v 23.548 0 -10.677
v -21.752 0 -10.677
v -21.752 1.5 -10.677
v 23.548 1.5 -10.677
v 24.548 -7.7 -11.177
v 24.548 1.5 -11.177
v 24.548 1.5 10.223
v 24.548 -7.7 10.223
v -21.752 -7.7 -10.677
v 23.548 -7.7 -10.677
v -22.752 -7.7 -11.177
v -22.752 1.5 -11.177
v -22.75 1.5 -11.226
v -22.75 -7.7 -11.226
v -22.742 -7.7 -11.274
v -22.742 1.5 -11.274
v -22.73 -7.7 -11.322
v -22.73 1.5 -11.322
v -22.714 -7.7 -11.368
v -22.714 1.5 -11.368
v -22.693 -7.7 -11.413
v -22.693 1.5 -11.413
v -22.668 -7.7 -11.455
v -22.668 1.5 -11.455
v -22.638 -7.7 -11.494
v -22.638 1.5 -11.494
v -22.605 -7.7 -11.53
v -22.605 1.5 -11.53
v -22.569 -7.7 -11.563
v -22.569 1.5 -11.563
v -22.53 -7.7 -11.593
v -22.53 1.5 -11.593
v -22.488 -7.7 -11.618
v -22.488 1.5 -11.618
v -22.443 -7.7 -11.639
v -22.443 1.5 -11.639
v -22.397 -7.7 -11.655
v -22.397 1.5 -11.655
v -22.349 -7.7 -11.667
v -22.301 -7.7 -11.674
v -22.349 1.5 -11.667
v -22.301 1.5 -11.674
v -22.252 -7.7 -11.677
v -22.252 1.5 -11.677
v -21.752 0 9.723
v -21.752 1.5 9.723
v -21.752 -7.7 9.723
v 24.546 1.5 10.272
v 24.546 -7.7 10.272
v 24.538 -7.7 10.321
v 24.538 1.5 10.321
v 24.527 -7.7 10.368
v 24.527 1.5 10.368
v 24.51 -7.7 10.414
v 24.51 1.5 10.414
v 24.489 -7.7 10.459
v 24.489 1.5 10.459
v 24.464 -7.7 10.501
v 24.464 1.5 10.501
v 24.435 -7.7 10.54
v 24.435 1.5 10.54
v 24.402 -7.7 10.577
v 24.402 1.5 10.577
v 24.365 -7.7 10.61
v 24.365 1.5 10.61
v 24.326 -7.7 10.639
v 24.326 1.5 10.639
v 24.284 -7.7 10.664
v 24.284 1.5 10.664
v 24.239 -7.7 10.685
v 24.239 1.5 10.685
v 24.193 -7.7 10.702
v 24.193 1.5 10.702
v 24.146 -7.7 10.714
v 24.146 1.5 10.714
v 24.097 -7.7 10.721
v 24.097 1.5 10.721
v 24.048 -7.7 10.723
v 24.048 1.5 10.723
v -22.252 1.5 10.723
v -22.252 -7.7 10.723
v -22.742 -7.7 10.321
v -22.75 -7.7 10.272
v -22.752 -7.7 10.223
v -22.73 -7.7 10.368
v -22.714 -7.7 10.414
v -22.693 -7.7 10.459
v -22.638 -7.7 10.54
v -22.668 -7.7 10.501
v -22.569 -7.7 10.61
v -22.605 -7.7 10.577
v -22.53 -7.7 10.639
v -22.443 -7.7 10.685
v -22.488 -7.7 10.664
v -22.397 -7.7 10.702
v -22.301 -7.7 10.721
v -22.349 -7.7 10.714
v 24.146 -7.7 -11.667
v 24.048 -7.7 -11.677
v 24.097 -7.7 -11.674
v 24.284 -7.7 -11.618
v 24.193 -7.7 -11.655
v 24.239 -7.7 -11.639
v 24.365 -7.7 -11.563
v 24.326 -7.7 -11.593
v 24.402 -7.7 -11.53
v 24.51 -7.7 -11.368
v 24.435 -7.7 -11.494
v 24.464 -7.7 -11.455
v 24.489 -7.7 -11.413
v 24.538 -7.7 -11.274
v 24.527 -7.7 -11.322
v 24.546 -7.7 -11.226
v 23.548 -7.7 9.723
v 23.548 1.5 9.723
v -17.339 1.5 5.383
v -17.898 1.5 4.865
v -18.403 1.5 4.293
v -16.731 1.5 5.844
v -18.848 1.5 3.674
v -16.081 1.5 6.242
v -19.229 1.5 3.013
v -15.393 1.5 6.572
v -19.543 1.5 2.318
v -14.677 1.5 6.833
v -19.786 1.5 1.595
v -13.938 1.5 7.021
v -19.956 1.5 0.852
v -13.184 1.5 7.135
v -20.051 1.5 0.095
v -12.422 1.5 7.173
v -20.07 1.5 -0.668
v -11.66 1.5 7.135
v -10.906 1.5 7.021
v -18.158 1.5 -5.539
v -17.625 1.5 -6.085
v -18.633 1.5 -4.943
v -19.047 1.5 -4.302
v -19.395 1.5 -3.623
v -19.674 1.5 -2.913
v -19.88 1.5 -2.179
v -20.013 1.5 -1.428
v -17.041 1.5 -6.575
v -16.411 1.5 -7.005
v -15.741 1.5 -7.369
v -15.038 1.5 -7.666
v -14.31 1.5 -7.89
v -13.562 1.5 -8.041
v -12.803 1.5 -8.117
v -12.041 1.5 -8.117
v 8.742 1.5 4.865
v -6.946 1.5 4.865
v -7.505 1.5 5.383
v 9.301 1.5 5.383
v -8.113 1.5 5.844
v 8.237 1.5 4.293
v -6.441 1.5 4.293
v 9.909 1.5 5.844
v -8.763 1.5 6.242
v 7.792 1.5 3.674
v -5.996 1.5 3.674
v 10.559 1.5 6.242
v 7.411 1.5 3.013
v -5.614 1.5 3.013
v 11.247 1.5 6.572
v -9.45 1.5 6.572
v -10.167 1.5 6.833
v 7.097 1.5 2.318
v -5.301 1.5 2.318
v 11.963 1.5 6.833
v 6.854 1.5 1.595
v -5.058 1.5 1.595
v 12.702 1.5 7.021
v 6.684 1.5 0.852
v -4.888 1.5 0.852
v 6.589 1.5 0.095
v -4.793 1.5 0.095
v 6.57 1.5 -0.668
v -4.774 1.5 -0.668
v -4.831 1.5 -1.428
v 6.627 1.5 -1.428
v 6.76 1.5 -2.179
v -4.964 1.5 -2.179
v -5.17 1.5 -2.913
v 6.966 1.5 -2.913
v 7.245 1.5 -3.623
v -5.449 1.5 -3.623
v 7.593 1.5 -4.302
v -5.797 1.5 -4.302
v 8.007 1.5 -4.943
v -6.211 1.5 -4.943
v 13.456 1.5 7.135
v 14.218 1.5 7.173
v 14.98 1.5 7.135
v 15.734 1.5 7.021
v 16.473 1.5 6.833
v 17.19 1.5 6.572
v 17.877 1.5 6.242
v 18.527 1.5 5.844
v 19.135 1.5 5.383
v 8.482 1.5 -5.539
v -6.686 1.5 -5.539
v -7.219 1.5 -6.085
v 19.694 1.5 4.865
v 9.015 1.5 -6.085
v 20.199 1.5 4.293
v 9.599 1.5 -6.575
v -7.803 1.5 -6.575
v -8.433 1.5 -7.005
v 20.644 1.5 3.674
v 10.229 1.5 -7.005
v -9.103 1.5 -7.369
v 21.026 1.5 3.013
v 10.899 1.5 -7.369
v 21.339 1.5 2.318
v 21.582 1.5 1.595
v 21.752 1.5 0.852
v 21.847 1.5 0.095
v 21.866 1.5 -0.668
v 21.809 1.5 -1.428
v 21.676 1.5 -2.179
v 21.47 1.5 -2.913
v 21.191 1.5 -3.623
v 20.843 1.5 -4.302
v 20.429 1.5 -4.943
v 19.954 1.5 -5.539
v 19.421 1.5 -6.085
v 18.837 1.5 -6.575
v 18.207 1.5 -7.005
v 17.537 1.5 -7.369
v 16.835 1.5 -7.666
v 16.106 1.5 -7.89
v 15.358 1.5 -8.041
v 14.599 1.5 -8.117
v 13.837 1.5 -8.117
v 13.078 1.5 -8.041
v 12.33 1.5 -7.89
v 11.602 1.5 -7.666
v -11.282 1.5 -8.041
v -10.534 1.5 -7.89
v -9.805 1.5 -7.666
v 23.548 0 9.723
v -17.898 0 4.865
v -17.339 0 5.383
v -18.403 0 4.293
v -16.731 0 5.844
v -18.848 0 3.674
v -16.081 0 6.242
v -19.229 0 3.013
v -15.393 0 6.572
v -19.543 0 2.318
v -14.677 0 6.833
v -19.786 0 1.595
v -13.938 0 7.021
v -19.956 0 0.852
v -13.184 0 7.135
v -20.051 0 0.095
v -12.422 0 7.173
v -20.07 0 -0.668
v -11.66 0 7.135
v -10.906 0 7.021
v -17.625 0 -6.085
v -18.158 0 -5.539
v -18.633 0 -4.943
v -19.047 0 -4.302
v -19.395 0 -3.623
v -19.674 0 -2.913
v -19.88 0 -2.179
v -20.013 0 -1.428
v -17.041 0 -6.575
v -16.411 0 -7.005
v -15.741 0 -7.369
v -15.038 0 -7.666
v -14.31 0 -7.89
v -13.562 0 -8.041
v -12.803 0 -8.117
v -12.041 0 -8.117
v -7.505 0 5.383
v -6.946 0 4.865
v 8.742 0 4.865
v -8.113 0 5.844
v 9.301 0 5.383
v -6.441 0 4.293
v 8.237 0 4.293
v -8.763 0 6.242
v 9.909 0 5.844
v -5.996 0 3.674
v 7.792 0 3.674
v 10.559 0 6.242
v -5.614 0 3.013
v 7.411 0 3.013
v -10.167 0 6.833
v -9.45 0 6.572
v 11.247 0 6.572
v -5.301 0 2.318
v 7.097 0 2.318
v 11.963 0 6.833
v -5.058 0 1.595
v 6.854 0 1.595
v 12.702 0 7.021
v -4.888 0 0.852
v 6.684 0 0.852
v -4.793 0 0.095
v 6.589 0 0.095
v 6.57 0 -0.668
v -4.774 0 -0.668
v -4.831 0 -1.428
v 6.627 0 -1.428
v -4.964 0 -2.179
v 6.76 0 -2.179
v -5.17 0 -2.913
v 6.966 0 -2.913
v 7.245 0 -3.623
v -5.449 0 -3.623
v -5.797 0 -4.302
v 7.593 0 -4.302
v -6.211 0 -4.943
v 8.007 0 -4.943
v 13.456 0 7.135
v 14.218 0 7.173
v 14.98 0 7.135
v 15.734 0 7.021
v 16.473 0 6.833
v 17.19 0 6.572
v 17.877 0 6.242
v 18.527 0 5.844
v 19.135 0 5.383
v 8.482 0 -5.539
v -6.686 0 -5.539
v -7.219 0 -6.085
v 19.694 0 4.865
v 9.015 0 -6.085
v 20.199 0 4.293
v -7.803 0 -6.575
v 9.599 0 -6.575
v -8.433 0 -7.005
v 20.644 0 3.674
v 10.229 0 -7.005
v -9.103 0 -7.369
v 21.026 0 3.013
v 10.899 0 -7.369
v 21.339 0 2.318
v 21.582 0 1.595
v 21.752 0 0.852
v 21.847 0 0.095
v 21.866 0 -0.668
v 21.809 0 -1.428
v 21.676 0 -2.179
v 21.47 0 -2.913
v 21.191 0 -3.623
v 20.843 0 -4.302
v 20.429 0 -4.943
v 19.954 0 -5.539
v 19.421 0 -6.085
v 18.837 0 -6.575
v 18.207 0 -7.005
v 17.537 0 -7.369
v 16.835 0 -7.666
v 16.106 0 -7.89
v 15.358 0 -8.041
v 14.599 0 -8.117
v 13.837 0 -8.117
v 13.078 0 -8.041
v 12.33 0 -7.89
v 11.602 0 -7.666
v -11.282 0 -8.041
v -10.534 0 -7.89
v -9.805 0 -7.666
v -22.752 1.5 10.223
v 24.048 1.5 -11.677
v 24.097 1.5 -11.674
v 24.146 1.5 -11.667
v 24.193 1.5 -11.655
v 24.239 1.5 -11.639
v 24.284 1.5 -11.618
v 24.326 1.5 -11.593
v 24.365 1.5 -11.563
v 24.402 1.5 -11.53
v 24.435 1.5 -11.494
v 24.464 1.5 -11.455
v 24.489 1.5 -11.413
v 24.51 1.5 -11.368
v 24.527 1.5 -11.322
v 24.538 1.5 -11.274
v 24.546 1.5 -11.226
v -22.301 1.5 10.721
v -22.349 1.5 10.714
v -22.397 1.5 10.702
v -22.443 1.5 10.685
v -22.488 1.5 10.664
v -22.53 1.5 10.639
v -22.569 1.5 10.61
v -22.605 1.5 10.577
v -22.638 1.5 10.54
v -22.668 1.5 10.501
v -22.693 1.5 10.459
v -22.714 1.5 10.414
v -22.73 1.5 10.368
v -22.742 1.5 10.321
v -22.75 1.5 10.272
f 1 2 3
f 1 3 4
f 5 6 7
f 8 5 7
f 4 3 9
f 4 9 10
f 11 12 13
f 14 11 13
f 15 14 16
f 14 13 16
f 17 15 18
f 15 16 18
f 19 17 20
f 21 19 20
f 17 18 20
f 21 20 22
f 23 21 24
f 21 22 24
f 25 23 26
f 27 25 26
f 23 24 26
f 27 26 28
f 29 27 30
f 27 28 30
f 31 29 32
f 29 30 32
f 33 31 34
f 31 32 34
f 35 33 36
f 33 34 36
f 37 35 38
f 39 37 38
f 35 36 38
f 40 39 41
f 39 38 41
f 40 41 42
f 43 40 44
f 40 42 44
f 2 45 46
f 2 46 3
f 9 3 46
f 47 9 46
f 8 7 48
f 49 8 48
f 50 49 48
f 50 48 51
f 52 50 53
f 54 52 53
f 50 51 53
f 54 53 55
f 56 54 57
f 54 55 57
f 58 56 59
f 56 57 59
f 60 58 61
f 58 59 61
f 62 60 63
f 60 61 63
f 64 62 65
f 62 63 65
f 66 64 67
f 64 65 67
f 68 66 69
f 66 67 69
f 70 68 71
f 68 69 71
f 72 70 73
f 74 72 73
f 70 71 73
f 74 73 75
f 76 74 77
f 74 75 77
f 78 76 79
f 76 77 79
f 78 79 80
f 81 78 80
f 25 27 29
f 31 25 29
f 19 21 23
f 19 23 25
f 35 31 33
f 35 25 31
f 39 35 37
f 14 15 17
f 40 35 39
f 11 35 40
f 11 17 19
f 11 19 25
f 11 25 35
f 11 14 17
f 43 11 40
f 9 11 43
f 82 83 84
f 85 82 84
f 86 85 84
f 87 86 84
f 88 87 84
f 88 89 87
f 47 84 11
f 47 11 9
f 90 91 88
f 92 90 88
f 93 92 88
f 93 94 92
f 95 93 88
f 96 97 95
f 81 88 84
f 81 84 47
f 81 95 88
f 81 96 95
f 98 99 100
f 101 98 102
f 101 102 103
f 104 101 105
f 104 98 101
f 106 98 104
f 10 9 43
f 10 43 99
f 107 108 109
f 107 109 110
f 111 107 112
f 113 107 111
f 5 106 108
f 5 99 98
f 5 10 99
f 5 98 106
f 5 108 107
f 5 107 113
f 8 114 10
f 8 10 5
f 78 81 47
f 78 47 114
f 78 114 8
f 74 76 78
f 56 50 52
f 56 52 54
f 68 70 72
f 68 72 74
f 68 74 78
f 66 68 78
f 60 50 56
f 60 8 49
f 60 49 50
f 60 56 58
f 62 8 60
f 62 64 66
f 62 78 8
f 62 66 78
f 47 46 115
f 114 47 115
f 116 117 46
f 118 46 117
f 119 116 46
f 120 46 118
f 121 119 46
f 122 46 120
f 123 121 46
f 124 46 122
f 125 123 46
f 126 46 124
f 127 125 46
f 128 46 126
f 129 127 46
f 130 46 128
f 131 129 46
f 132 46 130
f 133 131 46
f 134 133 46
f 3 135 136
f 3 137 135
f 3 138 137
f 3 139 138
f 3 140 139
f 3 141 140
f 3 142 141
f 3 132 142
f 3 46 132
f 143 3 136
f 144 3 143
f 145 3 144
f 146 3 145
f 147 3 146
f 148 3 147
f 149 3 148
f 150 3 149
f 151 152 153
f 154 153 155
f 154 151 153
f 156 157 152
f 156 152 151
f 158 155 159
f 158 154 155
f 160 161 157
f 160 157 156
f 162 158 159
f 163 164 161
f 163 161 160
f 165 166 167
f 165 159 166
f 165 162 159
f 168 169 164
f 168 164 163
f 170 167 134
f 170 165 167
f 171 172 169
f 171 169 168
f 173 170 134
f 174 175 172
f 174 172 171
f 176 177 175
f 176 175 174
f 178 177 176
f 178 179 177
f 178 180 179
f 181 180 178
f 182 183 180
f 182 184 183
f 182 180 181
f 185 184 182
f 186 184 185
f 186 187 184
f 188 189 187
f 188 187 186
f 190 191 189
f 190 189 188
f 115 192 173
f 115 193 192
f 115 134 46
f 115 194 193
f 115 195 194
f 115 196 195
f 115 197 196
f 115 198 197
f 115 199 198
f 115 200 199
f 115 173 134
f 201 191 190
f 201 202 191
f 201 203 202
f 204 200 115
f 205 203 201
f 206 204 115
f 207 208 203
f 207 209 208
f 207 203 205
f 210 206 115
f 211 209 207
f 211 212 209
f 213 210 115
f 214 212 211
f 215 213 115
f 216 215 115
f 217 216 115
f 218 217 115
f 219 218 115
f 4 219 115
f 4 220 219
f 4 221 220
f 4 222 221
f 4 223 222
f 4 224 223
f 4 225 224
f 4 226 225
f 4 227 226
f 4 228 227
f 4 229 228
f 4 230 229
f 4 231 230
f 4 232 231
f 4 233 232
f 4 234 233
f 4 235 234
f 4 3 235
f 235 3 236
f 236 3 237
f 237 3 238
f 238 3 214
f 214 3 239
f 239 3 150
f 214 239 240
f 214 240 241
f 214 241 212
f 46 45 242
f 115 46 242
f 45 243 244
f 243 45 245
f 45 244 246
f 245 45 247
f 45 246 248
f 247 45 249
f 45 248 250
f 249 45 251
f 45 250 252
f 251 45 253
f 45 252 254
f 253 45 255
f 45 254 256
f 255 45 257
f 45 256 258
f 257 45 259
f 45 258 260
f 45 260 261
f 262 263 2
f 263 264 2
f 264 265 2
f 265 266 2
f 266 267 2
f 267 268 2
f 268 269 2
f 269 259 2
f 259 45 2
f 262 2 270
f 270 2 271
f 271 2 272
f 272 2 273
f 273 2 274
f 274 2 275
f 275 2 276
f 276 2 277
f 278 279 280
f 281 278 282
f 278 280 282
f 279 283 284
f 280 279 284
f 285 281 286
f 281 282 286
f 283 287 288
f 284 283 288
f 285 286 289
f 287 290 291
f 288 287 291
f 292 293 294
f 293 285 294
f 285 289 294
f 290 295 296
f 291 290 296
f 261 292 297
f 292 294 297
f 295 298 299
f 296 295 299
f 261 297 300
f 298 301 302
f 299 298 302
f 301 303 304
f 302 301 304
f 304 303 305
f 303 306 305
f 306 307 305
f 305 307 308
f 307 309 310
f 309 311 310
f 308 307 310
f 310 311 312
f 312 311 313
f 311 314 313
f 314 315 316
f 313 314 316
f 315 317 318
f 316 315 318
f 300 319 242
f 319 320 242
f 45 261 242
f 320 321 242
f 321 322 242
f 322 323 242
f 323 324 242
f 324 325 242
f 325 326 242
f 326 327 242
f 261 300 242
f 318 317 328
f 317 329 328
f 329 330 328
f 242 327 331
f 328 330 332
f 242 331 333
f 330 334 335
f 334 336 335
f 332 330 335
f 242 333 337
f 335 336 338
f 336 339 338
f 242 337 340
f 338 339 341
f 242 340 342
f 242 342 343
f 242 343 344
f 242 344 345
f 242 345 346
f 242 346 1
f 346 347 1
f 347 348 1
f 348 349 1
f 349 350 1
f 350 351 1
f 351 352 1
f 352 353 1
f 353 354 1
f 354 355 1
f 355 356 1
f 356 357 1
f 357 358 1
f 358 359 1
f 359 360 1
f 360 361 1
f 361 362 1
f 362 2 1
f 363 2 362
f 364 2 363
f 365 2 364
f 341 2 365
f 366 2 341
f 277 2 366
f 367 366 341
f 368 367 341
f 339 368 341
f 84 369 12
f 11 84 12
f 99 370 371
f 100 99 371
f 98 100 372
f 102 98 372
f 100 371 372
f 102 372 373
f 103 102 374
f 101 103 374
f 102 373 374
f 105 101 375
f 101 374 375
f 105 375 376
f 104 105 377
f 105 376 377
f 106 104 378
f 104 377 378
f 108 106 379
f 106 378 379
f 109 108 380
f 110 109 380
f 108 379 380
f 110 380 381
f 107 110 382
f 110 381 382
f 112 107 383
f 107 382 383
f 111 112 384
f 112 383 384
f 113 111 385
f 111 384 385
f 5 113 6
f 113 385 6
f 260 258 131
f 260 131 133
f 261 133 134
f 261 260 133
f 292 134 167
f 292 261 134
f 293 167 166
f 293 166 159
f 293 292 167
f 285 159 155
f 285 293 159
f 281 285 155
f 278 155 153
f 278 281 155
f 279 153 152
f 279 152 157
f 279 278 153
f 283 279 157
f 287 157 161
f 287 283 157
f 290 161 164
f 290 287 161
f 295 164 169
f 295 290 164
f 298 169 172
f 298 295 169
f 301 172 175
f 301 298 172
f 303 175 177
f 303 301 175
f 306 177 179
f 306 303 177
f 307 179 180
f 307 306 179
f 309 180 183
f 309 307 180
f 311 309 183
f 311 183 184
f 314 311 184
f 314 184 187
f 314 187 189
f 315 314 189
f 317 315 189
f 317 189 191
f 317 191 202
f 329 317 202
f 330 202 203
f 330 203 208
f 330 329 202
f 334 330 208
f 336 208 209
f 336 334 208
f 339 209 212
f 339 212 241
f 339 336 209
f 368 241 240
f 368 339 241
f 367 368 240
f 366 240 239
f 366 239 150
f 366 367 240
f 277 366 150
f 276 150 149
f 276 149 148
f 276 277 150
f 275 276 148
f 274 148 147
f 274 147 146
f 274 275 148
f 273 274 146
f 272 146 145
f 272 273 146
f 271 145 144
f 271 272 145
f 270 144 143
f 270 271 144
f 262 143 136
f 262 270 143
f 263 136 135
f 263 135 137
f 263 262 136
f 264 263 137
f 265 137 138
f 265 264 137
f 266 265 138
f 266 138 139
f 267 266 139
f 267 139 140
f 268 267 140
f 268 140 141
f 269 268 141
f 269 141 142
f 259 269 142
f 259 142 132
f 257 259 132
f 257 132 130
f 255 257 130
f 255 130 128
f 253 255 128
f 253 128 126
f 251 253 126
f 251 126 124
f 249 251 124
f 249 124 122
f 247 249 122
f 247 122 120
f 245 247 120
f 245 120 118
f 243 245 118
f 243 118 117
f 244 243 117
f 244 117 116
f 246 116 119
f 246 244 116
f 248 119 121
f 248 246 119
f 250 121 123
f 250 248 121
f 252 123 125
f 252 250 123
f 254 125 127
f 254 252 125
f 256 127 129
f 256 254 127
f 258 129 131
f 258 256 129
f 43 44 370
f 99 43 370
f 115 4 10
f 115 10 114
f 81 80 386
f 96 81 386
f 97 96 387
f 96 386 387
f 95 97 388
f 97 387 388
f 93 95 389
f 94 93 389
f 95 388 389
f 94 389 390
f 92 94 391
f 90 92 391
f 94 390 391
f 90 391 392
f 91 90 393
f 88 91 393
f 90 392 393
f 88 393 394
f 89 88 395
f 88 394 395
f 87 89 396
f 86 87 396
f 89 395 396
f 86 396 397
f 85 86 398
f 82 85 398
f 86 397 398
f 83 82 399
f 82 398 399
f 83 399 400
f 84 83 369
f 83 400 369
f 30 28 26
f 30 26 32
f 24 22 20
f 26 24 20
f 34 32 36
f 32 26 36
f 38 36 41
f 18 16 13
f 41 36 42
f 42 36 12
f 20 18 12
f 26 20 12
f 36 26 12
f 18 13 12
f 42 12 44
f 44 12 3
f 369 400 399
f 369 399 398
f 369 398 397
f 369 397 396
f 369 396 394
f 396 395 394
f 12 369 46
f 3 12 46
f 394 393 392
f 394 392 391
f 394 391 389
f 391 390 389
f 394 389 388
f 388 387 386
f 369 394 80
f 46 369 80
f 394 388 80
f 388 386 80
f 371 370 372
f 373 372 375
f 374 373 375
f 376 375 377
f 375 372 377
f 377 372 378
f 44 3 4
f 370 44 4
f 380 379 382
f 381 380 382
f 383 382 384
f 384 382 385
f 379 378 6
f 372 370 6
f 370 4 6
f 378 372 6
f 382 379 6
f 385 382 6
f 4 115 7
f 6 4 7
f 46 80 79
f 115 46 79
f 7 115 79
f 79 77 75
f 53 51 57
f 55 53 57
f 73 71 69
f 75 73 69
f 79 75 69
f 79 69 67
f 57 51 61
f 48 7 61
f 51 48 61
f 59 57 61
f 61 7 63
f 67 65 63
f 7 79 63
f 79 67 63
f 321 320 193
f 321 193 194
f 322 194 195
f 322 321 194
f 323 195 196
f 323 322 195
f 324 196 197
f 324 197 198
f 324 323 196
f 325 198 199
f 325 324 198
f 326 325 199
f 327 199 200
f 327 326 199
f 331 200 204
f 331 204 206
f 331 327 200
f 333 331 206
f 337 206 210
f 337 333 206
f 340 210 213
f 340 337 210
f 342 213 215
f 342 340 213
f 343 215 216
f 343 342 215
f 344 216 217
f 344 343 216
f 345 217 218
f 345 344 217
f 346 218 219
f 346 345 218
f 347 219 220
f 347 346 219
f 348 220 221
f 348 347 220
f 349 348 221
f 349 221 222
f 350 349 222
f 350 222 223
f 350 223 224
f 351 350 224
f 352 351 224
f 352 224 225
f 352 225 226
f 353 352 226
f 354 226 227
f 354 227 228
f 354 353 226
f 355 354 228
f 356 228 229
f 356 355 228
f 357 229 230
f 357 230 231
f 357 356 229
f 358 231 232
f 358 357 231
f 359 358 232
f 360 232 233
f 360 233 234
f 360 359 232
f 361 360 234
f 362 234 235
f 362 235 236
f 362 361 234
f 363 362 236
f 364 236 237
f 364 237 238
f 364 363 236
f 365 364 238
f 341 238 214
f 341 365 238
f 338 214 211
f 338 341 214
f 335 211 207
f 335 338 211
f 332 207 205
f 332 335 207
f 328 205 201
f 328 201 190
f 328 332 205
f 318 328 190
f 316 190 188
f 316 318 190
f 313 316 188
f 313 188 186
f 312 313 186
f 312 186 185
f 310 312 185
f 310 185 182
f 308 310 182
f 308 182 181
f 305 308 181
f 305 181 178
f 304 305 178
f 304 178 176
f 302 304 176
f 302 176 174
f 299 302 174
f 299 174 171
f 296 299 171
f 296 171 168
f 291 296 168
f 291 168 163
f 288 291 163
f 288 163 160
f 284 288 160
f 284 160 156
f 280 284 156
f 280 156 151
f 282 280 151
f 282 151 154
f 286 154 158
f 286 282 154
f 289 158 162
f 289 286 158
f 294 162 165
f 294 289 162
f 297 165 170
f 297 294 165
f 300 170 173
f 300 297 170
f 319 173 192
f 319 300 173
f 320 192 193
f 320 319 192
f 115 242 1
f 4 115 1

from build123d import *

# Parameters (mm, degrees)
CROQUIS2_W                   = 45.3
CROQUIS2_H                   = 20.4
CROQUIS2_R                   = 7.65
SALIENTE_EXTRUIR1_DEPTH      = 1.5
SALIENTE_EXTRUIR2_DEPTH      = 7.7
SALIENTE_EXTRUIR2_DEPTH_BACK = 1.5
CROQUIS3_W                   = 45.3
CROQUIS3_H                   = 20.4


with BuildPart() as part:
    # Croquis2 → Saliente-Extruir1 (new body)
    with BuildSketch(Plane(origin=(0, 0, 0), x_dir=(1, 0, 0), z_dir=(0, 1, 0))):
        with Locations((0.898083434, 0.47687702)):
            Rectangle(CROQUIS2_W, CROQUIS2_H)
        with Locations(Location((14.218083434, 0.47687702, 0), (0, 0, 270))):
            Circle(CROQUIS2_R, mode=Mode.SUBTRACT)
        with Locations(Location((-12.421916566, 0.47687702, 0), (0, 0, 270))):
            Circle(CROQUIS2_R, mode=Mode.SUBTRACT)
    extrude(amount=SALIENTE_EXTRUIR1_DEPTH)


with BuildPart() as body_2:
    # Croquis3 → Saliente-Extruir2 (new, two sides: drawn at the far end of the back side and taken through both)
    with BuildSketch(Plane.XZ.offset(-SALIENTE_EXTRUIR2_DEPTH_BACK)):
        with BuildLine():
            Line((-22.751916566, 10.22312298), (-22.751916566, -11.17687702))
            ThreePointArc((-22.751916566, -11.17687702), (-22.605469957, -11.530430411), (-22.251916566, -11.67687702))
            Line((-22.251916566, -11.67687702), (24.048083434, -11.67687702))
            ThreePointArc((24.048083434, -11.67687702), (24.401636824, -11.530430411), (24.548083434, -11.17687702))
            Line((24.548083434, -11.17687702), (24.548083434, 10.22312298))
            ThreePointArc((24.548083434, 10.22312298), (24.401636824, 10.57667637), (24.048083434, 10.72312298))
            Line((24.048083434, 10.72312298), (-22.251916566, 10.72312298))
            ThreePointArc((-22.251916566, 10.72312298), (-22.605469957, 10.57667637), (-22.751916566, 10.22312298))
        make_face()
        with Locations((0.898083434, -0.47687702)):
            Rectangle(CROQUIS3_W, CROQUIS3_H, mode=Mode.SUBTRACT)
    extrude(amount=SALIENTE_EXTRUIR2_DEPTH + SALIENTE_EXTRUIR2_DEPTH_BACK)


solid = Compound([part.part, body_2.part])
